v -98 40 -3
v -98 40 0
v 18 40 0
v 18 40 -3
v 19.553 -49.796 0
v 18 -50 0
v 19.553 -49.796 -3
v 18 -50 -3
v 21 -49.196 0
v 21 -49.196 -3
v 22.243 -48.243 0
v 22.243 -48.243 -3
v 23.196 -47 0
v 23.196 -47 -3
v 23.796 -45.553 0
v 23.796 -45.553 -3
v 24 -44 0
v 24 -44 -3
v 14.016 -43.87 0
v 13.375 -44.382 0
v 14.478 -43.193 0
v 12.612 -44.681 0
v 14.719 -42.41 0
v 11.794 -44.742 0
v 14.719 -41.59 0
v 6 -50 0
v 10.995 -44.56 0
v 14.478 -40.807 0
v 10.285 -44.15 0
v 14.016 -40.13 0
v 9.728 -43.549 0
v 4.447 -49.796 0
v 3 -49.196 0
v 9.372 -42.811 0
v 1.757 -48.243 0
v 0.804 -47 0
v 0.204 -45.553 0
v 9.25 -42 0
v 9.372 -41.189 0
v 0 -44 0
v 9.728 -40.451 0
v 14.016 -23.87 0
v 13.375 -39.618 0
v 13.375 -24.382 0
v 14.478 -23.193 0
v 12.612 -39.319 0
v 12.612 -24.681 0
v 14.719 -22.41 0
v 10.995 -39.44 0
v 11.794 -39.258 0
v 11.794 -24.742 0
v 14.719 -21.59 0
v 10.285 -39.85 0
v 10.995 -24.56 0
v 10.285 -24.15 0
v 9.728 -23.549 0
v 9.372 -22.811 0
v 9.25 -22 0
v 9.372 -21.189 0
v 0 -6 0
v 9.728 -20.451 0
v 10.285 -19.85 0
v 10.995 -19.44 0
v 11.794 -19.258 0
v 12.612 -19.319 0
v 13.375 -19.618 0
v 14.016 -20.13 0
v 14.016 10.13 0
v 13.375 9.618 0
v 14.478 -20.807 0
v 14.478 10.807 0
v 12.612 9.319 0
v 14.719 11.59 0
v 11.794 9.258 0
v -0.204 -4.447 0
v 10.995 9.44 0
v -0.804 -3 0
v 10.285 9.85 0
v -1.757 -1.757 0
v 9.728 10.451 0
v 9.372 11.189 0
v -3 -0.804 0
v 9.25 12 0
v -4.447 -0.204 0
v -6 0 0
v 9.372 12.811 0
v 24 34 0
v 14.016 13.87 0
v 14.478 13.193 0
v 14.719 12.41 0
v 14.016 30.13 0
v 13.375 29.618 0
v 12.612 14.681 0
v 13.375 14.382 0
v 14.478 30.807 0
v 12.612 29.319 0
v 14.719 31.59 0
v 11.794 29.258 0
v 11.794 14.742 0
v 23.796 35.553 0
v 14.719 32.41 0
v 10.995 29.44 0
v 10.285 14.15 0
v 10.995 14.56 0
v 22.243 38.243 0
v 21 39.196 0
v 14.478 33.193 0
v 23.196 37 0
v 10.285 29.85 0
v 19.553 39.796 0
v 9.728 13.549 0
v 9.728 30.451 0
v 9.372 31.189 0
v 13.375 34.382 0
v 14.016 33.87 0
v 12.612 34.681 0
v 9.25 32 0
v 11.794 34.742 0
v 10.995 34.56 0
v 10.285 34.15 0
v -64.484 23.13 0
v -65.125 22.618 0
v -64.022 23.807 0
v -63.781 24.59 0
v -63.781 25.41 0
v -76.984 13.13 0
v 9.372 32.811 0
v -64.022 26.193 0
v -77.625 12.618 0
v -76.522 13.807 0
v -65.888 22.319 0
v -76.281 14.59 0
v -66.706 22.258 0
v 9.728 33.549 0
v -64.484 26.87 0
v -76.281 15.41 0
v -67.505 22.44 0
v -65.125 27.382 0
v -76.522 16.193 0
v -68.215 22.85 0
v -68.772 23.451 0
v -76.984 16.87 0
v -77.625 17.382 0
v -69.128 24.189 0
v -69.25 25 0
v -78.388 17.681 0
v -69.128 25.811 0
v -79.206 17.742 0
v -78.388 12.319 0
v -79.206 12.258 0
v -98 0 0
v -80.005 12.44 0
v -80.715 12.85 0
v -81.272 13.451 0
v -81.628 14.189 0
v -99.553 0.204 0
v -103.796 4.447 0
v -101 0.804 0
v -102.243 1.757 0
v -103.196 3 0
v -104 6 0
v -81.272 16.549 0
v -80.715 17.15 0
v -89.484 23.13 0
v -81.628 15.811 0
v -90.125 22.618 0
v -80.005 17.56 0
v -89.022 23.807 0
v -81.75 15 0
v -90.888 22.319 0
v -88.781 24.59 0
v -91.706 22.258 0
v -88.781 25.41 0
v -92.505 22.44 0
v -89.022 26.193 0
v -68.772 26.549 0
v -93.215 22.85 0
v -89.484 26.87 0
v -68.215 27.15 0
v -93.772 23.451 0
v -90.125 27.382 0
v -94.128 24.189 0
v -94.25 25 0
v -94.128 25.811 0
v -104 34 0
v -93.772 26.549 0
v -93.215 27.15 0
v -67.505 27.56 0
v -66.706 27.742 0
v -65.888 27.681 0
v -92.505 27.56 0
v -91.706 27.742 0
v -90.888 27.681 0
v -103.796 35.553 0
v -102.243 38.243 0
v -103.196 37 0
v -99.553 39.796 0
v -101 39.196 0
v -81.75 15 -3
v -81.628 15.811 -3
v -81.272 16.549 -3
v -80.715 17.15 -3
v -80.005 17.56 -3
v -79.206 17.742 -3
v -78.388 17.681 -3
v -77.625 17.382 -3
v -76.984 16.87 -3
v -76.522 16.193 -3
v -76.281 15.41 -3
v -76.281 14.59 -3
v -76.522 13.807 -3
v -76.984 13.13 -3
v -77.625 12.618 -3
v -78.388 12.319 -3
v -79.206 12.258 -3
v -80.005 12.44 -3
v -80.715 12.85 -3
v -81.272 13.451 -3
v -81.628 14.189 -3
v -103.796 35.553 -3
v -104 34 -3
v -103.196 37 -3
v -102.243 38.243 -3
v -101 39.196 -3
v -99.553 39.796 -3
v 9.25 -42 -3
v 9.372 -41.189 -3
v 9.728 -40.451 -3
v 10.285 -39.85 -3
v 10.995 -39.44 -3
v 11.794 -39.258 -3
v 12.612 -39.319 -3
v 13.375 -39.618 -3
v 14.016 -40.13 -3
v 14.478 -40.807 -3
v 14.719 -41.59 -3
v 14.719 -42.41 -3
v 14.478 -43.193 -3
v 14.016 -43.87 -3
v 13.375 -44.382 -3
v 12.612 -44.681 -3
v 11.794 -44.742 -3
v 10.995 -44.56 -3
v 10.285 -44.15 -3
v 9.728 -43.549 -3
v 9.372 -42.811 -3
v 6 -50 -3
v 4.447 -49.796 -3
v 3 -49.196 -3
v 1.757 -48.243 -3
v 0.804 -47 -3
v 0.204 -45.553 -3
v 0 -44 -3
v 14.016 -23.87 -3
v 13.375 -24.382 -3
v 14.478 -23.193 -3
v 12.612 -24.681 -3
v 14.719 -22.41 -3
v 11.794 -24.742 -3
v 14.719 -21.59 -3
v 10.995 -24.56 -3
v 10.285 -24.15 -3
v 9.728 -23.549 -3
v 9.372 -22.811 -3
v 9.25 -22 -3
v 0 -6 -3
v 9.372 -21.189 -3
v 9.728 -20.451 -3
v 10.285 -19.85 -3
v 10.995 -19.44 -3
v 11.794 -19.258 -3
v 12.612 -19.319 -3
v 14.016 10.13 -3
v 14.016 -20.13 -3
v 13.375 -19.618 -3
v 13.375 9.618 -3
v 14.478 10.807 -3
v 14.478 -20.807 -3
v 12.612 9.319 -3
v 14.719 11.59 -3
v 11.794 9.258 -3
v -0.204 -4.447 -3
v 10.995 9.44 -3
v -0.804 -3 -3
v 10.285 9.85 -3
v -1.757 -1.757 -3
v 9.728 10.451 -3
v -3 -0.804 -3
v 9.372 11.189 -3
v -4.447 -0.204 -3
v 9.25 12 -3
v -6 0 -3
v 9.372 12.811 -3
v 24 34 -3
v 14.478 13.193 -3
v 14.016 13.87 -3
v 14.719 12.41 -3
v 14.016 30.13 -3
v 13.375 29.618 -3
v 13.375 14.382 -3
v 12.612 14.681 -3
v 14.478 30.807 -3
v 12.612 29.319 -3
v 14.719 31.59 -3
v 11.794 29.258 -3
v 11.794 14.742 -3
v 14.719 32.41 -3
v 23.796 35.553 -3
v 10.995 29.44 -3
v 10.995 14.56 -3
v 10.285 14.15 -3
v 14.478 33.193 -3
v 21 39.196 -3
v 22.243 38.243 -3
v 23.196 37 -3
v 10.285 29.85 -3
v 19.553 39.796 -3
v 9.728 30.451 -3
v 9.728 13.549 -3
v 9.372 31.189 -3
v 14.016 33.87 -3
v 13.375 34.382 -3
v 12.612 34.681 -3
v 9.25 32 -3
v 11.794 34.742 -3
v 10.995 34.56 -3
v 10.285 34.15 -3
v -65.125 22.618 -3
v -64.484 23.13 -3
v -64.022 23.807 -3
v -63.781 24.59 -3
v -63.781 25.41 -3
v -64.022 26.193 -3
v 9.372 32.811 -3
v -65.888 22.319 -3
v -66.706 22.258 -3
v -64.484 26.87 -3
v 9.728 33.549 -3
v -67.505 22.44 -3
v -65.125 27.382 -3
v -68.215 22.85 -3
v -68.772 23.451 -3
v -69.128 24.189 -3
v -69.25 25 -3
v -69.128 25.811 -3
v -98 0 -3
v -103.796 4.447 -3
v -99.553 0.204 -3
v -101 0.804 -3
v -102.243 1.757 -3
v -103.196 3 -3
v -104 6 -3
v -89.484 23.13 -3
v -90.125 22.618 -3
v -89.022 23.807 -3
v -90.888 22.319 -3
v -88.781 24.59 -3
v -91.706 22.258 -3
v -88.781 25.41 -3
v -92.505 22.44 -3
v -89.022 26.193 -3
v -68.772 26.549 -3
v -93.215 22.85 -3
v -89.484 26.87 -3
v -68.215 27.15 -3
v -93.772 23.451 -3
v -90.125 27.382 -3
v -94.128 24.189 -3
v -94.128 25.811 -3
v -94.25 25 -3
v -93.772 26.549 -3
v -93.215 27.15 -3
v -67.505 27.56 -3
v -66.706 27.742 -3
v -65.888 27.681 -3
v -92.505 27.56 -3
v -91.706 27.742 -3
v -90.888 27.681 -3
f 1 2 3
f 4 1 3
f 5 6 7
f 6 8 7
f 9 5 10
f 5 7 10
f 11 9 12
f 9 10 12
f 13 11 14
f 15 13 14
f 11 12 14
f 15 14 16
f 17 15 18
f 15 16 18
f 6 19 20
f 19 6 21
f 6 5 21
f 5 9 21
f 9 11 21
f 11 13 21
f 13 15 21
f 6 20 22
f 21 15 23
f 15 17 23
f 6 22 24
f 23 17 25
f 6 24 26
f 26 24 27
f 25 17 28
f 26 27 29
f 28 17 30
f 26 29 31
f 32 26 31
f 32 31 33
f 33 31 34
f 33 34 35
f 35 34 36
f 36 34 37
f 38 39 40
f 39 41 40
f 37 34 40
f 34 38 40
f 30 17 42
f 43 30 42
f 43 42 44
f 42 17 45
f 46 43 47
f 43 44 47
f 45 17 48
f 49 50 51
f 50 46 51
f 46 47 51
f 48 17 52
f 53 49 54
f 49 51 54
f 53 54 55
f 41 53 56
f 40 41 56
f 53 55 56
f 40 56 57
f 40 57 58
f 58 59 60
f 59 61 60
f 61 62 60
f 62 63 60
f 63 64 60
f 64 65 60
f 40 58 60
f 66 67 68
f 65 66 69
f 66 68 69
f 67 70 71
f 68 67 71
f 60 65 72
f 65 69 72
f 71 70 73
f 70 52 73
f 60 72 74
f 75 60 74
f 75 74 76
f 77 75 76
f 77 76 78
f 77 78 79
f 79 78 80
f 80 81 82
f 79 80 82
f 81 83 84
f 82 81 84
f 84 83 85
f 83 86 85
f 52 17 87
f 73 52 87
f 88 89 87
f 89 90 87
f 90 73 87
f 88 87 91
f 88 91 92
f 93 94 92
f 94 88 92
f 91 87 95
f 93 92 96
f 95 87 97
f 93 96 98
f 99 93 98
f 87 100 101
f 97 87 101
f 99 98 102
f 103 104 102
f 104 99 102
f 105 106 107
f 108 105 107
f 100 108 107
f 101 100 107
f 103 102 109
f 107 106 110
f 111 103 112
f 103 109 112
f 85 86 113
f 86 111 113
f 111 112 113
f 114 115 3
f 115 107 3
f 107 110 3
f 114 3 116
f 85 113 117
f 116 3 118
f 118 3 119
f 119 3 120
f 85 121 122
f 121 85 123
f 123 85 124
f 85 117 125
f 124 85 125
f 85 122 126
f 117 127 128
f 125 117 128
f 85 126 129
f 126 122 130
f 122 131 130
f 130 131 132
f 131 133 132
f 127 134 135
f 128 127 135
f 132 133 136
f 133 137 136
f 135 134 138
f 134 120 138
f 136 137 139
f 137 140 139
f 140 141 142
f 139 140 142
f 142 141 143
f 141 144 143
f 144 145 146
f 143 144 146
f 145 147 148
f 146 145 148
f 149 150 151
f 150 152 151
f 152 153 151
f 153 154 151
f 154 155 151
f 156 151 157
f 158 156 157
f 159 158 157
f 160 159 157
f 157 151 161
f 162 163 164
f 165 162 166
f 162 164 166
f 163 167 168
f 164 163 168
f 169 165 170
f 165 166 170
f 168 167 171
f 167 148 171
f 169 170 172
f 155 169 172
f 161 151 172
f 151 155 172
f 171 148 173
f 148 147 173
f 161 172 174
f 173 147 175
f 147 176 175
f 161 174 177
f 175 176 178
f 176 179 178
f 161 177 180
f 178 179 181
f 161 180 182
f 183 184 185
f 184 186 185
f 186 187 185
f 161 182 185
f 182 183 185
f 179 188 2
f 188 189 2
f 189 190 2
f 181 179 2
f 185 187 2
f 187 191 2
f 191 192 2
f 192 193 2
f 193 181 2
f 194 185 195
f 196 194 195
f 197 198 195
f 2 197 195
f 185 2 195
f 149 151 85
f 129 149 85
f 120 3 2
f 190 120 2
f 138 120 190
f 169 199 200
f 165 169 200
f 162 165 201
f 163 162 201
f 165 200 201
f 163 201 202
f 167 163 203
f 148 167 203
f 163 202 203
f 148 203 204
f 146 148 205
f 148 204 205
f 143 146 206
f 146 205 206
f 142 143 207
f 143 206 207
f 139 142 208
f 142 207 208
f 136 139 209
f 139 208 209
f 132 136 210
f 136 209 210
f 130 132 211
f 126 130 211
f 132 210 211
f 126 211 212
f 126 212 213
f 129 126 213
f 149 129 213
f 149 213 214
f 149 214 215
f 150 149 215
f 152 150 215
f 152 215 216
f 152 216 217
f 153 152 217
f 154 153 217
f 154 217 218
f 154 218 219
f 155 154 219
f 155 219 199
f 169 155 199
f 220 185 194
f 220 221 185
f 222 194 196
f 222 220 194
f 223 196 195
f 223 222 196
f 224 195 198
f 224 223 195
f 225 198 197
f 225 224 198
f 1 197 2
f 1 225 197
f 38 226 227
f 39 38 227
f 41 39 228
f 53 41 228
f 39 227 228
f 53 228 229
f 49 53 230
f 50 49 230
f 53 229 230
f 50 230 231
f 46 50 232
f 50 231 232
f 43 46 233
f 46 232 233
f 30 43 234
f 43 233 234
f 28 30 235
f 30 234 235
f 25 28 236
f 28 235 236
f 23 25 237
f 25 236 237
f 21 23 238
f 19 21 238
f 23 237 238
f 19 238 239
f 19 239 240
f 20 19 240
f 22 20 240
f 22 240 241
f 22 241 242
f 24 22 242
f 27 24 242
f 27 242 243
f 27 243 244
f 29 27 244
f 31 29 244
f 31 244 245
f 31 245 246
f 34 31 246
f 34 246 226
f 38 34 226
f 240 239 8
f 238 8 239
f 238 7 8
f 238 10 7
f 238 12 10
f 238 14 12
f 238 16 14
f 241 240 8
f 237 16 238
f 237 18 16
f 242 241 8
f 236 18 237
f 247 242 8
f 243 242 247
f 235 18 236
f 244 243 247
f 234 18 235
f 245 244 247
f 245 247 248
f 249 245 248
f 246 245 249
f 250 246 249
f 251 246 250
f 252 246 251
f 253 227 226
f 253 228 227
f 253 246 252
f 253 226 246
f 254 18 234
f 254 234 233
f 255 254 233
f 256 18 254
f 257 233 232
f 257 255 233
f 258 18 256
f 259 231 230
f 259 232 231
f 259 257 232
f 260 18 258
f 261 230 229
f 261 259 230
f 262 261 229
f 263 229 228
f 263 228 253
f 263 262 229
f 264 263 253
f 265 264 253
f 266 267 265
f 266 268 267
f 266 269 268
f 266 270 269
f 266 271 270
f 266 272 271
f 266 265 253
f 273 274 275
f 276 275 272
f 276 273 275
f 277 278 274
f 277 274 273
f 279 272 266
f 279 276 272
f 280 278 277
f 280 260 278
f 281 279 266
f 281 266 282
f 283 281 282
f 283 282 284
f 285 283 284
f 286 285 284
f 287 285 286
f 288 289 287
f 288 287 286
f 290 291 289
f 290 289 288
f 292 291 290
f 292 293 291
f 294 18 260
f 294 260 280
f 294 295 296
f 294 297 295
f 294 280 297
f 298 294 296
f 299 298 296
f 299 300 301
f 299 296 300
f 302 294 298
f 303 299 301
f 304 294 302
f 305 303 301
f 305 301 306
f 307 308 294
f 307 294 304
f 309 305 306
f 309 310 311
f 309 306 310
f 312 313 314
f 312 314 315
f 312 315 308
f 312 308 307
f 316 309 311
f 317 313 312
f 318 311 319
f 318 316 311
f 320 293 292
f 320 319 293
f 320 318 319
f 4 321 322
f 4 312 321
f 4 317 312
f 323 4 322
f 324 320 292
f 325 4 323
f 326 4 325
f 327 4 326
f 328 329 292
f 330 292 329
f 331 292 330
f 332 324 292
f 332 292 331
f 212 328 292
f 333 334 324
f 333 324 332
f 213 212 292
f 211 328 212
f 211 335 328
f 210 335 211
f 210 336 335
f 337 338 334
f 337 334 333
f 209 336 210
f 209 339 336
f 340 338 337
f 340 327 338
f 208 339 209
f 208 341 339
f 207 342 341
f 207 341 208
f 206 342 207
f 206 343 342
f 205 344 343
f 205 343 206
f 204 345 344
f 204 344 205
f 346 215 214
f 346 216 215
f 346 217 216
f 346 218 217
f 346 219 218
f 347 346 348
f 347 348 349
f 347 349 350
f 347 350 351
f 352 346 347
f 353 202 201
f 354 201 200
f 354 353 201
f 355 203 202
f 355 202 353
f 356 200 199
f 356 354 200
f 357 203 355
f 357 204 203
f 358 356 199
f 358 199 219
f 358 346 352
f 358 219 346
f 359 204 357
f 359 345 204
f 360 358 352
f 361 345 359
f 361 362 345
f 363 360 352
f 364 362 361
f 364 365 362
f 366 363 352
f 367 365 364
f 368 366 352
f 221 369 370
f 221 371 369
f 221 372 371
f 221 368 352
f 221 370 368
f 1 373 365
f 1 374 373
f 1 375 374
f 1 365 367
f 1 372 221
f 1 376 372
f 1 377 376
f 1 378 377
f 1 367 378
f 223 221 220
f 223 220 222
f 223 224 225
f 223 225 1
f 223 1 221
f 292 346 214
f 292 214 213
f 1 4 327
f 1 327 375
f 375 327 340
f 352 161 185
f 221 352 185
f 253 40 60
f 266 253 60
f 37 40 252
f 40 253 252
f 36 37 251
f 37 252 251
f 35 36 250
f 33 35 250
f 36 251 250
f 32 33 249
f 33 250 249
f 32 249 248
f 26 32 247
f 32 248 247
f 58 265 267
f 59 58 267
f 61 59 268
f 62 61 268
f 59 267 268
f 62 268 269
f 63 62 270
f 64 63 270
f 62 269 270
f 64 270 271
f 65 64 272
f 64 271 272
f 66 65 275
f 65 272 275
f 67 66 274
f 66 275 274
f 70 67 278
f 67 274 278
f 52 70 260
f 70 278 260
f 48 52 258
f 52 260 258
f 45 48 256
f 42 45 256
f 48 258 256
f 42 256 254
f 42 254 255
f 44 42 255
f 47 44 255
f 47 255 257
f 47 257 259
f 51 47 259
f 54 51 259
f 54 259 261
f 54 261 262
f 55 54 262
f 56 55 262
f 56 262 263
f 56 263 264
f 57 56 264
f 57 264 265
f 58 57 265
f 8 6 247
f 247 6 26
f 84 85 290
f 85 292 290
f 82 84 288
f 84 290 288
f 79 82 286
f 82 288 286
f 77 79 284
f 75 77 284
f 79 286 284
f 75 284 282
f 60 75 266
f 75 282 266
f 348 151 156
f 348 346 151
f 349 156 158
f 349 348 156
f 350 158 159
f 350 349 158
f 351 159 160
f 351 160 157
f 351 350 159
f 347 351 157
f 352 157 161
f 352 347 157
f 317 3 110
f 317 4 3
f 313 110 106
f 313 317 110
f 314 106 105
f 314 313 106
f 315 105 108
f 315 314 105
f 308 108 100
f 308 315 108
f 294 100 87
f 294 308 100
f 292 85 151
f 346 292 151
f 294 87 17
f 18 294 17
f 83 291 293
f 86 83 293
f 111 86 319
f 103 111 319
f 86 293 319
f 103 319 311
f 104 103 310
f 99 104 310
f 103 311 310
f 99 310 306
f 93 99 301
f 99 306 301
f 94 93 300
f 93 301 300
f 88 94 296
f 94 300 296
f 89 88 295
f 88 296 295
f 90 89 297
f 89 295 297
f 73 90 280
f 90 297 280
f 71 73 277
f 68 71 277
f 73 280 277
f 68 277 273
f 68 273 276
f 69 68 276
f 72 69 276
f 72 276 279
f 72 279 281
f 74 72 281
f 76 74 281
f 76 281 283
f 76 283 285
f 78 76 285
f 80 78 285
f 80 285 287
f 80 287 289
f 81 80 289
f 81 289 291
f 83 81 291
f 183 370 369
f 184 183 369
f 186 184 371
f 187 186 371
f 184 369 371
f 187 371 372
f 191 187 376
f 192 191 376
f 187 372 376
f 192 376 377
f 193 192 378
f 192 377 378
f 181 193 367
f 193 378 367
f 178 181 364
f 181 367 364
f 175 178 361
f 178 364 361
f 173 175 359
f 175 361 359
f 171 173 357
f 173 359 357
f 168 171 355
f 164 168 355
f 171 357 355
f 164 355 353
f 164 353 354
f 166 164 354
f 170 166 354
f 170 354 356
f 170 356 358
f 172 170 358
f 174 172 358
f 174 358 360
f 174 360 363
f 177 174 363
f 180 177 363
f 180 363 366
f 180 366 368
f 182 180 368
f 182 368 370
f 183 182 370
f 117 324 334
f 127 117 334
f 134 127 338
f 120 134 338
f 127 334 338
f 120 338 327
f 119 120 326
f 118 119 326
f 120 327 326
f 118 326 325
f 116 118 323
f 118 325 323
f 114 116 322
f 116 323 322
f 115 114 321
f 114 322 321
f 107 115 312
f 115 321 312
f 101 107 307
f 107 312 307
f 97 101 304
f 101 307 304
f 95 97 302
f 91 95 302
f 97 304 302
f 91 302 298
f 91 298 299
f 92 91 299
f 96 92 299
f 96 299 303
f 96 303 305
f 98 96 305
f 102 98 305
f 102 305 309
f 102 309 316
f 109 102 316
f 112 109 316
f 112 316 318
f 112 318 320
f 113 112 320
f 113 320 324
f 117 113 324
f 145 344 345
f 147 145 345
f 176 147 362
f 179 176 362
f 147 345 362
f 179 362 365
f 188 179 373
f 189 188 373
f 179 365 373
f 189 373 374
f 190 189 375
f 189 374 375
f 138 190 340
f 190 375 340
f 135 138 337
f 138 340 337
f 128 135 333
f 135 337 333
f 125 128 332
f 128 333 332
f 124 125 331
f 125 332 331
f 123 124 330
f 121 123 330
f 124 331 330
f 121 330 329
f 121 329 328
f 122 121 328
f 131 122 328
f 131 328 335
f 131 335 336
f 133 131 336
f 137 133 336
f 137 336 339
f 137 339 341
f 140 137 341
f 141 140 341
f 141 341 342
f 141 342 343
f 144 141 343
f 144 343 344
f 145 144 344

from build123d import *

# Parameters (mm, degrees)
ODGI_CIE_BAZOWE1_DEPTH = 3
OTW_R_POD_RUB_M51_D    = 5.5
ZAOKR_GLENIE1_R        = 6


# Sheet-metal steps are written as plain solids
with BuildPart() as part:
    # Szkic1 → Odgięcie bazowe1 (new body)
    with BuildSketch(Plane.XY):
        Polygon((0, 0), (-104, 0), (-104, 40), (24, 40), (24, -50), (0, -50), align=None)
    extrude(amount=-ODGI_CIE_BAZOWE1_DEPTH)

    # Otwór pod śrubę M51 (through all)
    with Locations(Plane.XY):
        with Locations((12, -42), (12, -22), (12, 12), (12, 32), (-91.5, 25), (-66.5, 25), (-79, 15)):
            Hole(OTW_R_POD_RUB_M51_D / 2)

    # Zaokrąglenie1
    zaokr_glenie1_edges = [part.edges().sort_by_distance(p)[0] for p in [
        (0, 0, -1.5),
        (-104, 0, -1.5),
        (-104, 40, -1.5),
        (24, 40, -1.5),
        (24, -50, -1.5),
        (0, -50, -1.5),
    ]]
    fillet(zaokr_glenie1_edges, radius=ZAOKR_GLENIE1_R)


solid = part.part
